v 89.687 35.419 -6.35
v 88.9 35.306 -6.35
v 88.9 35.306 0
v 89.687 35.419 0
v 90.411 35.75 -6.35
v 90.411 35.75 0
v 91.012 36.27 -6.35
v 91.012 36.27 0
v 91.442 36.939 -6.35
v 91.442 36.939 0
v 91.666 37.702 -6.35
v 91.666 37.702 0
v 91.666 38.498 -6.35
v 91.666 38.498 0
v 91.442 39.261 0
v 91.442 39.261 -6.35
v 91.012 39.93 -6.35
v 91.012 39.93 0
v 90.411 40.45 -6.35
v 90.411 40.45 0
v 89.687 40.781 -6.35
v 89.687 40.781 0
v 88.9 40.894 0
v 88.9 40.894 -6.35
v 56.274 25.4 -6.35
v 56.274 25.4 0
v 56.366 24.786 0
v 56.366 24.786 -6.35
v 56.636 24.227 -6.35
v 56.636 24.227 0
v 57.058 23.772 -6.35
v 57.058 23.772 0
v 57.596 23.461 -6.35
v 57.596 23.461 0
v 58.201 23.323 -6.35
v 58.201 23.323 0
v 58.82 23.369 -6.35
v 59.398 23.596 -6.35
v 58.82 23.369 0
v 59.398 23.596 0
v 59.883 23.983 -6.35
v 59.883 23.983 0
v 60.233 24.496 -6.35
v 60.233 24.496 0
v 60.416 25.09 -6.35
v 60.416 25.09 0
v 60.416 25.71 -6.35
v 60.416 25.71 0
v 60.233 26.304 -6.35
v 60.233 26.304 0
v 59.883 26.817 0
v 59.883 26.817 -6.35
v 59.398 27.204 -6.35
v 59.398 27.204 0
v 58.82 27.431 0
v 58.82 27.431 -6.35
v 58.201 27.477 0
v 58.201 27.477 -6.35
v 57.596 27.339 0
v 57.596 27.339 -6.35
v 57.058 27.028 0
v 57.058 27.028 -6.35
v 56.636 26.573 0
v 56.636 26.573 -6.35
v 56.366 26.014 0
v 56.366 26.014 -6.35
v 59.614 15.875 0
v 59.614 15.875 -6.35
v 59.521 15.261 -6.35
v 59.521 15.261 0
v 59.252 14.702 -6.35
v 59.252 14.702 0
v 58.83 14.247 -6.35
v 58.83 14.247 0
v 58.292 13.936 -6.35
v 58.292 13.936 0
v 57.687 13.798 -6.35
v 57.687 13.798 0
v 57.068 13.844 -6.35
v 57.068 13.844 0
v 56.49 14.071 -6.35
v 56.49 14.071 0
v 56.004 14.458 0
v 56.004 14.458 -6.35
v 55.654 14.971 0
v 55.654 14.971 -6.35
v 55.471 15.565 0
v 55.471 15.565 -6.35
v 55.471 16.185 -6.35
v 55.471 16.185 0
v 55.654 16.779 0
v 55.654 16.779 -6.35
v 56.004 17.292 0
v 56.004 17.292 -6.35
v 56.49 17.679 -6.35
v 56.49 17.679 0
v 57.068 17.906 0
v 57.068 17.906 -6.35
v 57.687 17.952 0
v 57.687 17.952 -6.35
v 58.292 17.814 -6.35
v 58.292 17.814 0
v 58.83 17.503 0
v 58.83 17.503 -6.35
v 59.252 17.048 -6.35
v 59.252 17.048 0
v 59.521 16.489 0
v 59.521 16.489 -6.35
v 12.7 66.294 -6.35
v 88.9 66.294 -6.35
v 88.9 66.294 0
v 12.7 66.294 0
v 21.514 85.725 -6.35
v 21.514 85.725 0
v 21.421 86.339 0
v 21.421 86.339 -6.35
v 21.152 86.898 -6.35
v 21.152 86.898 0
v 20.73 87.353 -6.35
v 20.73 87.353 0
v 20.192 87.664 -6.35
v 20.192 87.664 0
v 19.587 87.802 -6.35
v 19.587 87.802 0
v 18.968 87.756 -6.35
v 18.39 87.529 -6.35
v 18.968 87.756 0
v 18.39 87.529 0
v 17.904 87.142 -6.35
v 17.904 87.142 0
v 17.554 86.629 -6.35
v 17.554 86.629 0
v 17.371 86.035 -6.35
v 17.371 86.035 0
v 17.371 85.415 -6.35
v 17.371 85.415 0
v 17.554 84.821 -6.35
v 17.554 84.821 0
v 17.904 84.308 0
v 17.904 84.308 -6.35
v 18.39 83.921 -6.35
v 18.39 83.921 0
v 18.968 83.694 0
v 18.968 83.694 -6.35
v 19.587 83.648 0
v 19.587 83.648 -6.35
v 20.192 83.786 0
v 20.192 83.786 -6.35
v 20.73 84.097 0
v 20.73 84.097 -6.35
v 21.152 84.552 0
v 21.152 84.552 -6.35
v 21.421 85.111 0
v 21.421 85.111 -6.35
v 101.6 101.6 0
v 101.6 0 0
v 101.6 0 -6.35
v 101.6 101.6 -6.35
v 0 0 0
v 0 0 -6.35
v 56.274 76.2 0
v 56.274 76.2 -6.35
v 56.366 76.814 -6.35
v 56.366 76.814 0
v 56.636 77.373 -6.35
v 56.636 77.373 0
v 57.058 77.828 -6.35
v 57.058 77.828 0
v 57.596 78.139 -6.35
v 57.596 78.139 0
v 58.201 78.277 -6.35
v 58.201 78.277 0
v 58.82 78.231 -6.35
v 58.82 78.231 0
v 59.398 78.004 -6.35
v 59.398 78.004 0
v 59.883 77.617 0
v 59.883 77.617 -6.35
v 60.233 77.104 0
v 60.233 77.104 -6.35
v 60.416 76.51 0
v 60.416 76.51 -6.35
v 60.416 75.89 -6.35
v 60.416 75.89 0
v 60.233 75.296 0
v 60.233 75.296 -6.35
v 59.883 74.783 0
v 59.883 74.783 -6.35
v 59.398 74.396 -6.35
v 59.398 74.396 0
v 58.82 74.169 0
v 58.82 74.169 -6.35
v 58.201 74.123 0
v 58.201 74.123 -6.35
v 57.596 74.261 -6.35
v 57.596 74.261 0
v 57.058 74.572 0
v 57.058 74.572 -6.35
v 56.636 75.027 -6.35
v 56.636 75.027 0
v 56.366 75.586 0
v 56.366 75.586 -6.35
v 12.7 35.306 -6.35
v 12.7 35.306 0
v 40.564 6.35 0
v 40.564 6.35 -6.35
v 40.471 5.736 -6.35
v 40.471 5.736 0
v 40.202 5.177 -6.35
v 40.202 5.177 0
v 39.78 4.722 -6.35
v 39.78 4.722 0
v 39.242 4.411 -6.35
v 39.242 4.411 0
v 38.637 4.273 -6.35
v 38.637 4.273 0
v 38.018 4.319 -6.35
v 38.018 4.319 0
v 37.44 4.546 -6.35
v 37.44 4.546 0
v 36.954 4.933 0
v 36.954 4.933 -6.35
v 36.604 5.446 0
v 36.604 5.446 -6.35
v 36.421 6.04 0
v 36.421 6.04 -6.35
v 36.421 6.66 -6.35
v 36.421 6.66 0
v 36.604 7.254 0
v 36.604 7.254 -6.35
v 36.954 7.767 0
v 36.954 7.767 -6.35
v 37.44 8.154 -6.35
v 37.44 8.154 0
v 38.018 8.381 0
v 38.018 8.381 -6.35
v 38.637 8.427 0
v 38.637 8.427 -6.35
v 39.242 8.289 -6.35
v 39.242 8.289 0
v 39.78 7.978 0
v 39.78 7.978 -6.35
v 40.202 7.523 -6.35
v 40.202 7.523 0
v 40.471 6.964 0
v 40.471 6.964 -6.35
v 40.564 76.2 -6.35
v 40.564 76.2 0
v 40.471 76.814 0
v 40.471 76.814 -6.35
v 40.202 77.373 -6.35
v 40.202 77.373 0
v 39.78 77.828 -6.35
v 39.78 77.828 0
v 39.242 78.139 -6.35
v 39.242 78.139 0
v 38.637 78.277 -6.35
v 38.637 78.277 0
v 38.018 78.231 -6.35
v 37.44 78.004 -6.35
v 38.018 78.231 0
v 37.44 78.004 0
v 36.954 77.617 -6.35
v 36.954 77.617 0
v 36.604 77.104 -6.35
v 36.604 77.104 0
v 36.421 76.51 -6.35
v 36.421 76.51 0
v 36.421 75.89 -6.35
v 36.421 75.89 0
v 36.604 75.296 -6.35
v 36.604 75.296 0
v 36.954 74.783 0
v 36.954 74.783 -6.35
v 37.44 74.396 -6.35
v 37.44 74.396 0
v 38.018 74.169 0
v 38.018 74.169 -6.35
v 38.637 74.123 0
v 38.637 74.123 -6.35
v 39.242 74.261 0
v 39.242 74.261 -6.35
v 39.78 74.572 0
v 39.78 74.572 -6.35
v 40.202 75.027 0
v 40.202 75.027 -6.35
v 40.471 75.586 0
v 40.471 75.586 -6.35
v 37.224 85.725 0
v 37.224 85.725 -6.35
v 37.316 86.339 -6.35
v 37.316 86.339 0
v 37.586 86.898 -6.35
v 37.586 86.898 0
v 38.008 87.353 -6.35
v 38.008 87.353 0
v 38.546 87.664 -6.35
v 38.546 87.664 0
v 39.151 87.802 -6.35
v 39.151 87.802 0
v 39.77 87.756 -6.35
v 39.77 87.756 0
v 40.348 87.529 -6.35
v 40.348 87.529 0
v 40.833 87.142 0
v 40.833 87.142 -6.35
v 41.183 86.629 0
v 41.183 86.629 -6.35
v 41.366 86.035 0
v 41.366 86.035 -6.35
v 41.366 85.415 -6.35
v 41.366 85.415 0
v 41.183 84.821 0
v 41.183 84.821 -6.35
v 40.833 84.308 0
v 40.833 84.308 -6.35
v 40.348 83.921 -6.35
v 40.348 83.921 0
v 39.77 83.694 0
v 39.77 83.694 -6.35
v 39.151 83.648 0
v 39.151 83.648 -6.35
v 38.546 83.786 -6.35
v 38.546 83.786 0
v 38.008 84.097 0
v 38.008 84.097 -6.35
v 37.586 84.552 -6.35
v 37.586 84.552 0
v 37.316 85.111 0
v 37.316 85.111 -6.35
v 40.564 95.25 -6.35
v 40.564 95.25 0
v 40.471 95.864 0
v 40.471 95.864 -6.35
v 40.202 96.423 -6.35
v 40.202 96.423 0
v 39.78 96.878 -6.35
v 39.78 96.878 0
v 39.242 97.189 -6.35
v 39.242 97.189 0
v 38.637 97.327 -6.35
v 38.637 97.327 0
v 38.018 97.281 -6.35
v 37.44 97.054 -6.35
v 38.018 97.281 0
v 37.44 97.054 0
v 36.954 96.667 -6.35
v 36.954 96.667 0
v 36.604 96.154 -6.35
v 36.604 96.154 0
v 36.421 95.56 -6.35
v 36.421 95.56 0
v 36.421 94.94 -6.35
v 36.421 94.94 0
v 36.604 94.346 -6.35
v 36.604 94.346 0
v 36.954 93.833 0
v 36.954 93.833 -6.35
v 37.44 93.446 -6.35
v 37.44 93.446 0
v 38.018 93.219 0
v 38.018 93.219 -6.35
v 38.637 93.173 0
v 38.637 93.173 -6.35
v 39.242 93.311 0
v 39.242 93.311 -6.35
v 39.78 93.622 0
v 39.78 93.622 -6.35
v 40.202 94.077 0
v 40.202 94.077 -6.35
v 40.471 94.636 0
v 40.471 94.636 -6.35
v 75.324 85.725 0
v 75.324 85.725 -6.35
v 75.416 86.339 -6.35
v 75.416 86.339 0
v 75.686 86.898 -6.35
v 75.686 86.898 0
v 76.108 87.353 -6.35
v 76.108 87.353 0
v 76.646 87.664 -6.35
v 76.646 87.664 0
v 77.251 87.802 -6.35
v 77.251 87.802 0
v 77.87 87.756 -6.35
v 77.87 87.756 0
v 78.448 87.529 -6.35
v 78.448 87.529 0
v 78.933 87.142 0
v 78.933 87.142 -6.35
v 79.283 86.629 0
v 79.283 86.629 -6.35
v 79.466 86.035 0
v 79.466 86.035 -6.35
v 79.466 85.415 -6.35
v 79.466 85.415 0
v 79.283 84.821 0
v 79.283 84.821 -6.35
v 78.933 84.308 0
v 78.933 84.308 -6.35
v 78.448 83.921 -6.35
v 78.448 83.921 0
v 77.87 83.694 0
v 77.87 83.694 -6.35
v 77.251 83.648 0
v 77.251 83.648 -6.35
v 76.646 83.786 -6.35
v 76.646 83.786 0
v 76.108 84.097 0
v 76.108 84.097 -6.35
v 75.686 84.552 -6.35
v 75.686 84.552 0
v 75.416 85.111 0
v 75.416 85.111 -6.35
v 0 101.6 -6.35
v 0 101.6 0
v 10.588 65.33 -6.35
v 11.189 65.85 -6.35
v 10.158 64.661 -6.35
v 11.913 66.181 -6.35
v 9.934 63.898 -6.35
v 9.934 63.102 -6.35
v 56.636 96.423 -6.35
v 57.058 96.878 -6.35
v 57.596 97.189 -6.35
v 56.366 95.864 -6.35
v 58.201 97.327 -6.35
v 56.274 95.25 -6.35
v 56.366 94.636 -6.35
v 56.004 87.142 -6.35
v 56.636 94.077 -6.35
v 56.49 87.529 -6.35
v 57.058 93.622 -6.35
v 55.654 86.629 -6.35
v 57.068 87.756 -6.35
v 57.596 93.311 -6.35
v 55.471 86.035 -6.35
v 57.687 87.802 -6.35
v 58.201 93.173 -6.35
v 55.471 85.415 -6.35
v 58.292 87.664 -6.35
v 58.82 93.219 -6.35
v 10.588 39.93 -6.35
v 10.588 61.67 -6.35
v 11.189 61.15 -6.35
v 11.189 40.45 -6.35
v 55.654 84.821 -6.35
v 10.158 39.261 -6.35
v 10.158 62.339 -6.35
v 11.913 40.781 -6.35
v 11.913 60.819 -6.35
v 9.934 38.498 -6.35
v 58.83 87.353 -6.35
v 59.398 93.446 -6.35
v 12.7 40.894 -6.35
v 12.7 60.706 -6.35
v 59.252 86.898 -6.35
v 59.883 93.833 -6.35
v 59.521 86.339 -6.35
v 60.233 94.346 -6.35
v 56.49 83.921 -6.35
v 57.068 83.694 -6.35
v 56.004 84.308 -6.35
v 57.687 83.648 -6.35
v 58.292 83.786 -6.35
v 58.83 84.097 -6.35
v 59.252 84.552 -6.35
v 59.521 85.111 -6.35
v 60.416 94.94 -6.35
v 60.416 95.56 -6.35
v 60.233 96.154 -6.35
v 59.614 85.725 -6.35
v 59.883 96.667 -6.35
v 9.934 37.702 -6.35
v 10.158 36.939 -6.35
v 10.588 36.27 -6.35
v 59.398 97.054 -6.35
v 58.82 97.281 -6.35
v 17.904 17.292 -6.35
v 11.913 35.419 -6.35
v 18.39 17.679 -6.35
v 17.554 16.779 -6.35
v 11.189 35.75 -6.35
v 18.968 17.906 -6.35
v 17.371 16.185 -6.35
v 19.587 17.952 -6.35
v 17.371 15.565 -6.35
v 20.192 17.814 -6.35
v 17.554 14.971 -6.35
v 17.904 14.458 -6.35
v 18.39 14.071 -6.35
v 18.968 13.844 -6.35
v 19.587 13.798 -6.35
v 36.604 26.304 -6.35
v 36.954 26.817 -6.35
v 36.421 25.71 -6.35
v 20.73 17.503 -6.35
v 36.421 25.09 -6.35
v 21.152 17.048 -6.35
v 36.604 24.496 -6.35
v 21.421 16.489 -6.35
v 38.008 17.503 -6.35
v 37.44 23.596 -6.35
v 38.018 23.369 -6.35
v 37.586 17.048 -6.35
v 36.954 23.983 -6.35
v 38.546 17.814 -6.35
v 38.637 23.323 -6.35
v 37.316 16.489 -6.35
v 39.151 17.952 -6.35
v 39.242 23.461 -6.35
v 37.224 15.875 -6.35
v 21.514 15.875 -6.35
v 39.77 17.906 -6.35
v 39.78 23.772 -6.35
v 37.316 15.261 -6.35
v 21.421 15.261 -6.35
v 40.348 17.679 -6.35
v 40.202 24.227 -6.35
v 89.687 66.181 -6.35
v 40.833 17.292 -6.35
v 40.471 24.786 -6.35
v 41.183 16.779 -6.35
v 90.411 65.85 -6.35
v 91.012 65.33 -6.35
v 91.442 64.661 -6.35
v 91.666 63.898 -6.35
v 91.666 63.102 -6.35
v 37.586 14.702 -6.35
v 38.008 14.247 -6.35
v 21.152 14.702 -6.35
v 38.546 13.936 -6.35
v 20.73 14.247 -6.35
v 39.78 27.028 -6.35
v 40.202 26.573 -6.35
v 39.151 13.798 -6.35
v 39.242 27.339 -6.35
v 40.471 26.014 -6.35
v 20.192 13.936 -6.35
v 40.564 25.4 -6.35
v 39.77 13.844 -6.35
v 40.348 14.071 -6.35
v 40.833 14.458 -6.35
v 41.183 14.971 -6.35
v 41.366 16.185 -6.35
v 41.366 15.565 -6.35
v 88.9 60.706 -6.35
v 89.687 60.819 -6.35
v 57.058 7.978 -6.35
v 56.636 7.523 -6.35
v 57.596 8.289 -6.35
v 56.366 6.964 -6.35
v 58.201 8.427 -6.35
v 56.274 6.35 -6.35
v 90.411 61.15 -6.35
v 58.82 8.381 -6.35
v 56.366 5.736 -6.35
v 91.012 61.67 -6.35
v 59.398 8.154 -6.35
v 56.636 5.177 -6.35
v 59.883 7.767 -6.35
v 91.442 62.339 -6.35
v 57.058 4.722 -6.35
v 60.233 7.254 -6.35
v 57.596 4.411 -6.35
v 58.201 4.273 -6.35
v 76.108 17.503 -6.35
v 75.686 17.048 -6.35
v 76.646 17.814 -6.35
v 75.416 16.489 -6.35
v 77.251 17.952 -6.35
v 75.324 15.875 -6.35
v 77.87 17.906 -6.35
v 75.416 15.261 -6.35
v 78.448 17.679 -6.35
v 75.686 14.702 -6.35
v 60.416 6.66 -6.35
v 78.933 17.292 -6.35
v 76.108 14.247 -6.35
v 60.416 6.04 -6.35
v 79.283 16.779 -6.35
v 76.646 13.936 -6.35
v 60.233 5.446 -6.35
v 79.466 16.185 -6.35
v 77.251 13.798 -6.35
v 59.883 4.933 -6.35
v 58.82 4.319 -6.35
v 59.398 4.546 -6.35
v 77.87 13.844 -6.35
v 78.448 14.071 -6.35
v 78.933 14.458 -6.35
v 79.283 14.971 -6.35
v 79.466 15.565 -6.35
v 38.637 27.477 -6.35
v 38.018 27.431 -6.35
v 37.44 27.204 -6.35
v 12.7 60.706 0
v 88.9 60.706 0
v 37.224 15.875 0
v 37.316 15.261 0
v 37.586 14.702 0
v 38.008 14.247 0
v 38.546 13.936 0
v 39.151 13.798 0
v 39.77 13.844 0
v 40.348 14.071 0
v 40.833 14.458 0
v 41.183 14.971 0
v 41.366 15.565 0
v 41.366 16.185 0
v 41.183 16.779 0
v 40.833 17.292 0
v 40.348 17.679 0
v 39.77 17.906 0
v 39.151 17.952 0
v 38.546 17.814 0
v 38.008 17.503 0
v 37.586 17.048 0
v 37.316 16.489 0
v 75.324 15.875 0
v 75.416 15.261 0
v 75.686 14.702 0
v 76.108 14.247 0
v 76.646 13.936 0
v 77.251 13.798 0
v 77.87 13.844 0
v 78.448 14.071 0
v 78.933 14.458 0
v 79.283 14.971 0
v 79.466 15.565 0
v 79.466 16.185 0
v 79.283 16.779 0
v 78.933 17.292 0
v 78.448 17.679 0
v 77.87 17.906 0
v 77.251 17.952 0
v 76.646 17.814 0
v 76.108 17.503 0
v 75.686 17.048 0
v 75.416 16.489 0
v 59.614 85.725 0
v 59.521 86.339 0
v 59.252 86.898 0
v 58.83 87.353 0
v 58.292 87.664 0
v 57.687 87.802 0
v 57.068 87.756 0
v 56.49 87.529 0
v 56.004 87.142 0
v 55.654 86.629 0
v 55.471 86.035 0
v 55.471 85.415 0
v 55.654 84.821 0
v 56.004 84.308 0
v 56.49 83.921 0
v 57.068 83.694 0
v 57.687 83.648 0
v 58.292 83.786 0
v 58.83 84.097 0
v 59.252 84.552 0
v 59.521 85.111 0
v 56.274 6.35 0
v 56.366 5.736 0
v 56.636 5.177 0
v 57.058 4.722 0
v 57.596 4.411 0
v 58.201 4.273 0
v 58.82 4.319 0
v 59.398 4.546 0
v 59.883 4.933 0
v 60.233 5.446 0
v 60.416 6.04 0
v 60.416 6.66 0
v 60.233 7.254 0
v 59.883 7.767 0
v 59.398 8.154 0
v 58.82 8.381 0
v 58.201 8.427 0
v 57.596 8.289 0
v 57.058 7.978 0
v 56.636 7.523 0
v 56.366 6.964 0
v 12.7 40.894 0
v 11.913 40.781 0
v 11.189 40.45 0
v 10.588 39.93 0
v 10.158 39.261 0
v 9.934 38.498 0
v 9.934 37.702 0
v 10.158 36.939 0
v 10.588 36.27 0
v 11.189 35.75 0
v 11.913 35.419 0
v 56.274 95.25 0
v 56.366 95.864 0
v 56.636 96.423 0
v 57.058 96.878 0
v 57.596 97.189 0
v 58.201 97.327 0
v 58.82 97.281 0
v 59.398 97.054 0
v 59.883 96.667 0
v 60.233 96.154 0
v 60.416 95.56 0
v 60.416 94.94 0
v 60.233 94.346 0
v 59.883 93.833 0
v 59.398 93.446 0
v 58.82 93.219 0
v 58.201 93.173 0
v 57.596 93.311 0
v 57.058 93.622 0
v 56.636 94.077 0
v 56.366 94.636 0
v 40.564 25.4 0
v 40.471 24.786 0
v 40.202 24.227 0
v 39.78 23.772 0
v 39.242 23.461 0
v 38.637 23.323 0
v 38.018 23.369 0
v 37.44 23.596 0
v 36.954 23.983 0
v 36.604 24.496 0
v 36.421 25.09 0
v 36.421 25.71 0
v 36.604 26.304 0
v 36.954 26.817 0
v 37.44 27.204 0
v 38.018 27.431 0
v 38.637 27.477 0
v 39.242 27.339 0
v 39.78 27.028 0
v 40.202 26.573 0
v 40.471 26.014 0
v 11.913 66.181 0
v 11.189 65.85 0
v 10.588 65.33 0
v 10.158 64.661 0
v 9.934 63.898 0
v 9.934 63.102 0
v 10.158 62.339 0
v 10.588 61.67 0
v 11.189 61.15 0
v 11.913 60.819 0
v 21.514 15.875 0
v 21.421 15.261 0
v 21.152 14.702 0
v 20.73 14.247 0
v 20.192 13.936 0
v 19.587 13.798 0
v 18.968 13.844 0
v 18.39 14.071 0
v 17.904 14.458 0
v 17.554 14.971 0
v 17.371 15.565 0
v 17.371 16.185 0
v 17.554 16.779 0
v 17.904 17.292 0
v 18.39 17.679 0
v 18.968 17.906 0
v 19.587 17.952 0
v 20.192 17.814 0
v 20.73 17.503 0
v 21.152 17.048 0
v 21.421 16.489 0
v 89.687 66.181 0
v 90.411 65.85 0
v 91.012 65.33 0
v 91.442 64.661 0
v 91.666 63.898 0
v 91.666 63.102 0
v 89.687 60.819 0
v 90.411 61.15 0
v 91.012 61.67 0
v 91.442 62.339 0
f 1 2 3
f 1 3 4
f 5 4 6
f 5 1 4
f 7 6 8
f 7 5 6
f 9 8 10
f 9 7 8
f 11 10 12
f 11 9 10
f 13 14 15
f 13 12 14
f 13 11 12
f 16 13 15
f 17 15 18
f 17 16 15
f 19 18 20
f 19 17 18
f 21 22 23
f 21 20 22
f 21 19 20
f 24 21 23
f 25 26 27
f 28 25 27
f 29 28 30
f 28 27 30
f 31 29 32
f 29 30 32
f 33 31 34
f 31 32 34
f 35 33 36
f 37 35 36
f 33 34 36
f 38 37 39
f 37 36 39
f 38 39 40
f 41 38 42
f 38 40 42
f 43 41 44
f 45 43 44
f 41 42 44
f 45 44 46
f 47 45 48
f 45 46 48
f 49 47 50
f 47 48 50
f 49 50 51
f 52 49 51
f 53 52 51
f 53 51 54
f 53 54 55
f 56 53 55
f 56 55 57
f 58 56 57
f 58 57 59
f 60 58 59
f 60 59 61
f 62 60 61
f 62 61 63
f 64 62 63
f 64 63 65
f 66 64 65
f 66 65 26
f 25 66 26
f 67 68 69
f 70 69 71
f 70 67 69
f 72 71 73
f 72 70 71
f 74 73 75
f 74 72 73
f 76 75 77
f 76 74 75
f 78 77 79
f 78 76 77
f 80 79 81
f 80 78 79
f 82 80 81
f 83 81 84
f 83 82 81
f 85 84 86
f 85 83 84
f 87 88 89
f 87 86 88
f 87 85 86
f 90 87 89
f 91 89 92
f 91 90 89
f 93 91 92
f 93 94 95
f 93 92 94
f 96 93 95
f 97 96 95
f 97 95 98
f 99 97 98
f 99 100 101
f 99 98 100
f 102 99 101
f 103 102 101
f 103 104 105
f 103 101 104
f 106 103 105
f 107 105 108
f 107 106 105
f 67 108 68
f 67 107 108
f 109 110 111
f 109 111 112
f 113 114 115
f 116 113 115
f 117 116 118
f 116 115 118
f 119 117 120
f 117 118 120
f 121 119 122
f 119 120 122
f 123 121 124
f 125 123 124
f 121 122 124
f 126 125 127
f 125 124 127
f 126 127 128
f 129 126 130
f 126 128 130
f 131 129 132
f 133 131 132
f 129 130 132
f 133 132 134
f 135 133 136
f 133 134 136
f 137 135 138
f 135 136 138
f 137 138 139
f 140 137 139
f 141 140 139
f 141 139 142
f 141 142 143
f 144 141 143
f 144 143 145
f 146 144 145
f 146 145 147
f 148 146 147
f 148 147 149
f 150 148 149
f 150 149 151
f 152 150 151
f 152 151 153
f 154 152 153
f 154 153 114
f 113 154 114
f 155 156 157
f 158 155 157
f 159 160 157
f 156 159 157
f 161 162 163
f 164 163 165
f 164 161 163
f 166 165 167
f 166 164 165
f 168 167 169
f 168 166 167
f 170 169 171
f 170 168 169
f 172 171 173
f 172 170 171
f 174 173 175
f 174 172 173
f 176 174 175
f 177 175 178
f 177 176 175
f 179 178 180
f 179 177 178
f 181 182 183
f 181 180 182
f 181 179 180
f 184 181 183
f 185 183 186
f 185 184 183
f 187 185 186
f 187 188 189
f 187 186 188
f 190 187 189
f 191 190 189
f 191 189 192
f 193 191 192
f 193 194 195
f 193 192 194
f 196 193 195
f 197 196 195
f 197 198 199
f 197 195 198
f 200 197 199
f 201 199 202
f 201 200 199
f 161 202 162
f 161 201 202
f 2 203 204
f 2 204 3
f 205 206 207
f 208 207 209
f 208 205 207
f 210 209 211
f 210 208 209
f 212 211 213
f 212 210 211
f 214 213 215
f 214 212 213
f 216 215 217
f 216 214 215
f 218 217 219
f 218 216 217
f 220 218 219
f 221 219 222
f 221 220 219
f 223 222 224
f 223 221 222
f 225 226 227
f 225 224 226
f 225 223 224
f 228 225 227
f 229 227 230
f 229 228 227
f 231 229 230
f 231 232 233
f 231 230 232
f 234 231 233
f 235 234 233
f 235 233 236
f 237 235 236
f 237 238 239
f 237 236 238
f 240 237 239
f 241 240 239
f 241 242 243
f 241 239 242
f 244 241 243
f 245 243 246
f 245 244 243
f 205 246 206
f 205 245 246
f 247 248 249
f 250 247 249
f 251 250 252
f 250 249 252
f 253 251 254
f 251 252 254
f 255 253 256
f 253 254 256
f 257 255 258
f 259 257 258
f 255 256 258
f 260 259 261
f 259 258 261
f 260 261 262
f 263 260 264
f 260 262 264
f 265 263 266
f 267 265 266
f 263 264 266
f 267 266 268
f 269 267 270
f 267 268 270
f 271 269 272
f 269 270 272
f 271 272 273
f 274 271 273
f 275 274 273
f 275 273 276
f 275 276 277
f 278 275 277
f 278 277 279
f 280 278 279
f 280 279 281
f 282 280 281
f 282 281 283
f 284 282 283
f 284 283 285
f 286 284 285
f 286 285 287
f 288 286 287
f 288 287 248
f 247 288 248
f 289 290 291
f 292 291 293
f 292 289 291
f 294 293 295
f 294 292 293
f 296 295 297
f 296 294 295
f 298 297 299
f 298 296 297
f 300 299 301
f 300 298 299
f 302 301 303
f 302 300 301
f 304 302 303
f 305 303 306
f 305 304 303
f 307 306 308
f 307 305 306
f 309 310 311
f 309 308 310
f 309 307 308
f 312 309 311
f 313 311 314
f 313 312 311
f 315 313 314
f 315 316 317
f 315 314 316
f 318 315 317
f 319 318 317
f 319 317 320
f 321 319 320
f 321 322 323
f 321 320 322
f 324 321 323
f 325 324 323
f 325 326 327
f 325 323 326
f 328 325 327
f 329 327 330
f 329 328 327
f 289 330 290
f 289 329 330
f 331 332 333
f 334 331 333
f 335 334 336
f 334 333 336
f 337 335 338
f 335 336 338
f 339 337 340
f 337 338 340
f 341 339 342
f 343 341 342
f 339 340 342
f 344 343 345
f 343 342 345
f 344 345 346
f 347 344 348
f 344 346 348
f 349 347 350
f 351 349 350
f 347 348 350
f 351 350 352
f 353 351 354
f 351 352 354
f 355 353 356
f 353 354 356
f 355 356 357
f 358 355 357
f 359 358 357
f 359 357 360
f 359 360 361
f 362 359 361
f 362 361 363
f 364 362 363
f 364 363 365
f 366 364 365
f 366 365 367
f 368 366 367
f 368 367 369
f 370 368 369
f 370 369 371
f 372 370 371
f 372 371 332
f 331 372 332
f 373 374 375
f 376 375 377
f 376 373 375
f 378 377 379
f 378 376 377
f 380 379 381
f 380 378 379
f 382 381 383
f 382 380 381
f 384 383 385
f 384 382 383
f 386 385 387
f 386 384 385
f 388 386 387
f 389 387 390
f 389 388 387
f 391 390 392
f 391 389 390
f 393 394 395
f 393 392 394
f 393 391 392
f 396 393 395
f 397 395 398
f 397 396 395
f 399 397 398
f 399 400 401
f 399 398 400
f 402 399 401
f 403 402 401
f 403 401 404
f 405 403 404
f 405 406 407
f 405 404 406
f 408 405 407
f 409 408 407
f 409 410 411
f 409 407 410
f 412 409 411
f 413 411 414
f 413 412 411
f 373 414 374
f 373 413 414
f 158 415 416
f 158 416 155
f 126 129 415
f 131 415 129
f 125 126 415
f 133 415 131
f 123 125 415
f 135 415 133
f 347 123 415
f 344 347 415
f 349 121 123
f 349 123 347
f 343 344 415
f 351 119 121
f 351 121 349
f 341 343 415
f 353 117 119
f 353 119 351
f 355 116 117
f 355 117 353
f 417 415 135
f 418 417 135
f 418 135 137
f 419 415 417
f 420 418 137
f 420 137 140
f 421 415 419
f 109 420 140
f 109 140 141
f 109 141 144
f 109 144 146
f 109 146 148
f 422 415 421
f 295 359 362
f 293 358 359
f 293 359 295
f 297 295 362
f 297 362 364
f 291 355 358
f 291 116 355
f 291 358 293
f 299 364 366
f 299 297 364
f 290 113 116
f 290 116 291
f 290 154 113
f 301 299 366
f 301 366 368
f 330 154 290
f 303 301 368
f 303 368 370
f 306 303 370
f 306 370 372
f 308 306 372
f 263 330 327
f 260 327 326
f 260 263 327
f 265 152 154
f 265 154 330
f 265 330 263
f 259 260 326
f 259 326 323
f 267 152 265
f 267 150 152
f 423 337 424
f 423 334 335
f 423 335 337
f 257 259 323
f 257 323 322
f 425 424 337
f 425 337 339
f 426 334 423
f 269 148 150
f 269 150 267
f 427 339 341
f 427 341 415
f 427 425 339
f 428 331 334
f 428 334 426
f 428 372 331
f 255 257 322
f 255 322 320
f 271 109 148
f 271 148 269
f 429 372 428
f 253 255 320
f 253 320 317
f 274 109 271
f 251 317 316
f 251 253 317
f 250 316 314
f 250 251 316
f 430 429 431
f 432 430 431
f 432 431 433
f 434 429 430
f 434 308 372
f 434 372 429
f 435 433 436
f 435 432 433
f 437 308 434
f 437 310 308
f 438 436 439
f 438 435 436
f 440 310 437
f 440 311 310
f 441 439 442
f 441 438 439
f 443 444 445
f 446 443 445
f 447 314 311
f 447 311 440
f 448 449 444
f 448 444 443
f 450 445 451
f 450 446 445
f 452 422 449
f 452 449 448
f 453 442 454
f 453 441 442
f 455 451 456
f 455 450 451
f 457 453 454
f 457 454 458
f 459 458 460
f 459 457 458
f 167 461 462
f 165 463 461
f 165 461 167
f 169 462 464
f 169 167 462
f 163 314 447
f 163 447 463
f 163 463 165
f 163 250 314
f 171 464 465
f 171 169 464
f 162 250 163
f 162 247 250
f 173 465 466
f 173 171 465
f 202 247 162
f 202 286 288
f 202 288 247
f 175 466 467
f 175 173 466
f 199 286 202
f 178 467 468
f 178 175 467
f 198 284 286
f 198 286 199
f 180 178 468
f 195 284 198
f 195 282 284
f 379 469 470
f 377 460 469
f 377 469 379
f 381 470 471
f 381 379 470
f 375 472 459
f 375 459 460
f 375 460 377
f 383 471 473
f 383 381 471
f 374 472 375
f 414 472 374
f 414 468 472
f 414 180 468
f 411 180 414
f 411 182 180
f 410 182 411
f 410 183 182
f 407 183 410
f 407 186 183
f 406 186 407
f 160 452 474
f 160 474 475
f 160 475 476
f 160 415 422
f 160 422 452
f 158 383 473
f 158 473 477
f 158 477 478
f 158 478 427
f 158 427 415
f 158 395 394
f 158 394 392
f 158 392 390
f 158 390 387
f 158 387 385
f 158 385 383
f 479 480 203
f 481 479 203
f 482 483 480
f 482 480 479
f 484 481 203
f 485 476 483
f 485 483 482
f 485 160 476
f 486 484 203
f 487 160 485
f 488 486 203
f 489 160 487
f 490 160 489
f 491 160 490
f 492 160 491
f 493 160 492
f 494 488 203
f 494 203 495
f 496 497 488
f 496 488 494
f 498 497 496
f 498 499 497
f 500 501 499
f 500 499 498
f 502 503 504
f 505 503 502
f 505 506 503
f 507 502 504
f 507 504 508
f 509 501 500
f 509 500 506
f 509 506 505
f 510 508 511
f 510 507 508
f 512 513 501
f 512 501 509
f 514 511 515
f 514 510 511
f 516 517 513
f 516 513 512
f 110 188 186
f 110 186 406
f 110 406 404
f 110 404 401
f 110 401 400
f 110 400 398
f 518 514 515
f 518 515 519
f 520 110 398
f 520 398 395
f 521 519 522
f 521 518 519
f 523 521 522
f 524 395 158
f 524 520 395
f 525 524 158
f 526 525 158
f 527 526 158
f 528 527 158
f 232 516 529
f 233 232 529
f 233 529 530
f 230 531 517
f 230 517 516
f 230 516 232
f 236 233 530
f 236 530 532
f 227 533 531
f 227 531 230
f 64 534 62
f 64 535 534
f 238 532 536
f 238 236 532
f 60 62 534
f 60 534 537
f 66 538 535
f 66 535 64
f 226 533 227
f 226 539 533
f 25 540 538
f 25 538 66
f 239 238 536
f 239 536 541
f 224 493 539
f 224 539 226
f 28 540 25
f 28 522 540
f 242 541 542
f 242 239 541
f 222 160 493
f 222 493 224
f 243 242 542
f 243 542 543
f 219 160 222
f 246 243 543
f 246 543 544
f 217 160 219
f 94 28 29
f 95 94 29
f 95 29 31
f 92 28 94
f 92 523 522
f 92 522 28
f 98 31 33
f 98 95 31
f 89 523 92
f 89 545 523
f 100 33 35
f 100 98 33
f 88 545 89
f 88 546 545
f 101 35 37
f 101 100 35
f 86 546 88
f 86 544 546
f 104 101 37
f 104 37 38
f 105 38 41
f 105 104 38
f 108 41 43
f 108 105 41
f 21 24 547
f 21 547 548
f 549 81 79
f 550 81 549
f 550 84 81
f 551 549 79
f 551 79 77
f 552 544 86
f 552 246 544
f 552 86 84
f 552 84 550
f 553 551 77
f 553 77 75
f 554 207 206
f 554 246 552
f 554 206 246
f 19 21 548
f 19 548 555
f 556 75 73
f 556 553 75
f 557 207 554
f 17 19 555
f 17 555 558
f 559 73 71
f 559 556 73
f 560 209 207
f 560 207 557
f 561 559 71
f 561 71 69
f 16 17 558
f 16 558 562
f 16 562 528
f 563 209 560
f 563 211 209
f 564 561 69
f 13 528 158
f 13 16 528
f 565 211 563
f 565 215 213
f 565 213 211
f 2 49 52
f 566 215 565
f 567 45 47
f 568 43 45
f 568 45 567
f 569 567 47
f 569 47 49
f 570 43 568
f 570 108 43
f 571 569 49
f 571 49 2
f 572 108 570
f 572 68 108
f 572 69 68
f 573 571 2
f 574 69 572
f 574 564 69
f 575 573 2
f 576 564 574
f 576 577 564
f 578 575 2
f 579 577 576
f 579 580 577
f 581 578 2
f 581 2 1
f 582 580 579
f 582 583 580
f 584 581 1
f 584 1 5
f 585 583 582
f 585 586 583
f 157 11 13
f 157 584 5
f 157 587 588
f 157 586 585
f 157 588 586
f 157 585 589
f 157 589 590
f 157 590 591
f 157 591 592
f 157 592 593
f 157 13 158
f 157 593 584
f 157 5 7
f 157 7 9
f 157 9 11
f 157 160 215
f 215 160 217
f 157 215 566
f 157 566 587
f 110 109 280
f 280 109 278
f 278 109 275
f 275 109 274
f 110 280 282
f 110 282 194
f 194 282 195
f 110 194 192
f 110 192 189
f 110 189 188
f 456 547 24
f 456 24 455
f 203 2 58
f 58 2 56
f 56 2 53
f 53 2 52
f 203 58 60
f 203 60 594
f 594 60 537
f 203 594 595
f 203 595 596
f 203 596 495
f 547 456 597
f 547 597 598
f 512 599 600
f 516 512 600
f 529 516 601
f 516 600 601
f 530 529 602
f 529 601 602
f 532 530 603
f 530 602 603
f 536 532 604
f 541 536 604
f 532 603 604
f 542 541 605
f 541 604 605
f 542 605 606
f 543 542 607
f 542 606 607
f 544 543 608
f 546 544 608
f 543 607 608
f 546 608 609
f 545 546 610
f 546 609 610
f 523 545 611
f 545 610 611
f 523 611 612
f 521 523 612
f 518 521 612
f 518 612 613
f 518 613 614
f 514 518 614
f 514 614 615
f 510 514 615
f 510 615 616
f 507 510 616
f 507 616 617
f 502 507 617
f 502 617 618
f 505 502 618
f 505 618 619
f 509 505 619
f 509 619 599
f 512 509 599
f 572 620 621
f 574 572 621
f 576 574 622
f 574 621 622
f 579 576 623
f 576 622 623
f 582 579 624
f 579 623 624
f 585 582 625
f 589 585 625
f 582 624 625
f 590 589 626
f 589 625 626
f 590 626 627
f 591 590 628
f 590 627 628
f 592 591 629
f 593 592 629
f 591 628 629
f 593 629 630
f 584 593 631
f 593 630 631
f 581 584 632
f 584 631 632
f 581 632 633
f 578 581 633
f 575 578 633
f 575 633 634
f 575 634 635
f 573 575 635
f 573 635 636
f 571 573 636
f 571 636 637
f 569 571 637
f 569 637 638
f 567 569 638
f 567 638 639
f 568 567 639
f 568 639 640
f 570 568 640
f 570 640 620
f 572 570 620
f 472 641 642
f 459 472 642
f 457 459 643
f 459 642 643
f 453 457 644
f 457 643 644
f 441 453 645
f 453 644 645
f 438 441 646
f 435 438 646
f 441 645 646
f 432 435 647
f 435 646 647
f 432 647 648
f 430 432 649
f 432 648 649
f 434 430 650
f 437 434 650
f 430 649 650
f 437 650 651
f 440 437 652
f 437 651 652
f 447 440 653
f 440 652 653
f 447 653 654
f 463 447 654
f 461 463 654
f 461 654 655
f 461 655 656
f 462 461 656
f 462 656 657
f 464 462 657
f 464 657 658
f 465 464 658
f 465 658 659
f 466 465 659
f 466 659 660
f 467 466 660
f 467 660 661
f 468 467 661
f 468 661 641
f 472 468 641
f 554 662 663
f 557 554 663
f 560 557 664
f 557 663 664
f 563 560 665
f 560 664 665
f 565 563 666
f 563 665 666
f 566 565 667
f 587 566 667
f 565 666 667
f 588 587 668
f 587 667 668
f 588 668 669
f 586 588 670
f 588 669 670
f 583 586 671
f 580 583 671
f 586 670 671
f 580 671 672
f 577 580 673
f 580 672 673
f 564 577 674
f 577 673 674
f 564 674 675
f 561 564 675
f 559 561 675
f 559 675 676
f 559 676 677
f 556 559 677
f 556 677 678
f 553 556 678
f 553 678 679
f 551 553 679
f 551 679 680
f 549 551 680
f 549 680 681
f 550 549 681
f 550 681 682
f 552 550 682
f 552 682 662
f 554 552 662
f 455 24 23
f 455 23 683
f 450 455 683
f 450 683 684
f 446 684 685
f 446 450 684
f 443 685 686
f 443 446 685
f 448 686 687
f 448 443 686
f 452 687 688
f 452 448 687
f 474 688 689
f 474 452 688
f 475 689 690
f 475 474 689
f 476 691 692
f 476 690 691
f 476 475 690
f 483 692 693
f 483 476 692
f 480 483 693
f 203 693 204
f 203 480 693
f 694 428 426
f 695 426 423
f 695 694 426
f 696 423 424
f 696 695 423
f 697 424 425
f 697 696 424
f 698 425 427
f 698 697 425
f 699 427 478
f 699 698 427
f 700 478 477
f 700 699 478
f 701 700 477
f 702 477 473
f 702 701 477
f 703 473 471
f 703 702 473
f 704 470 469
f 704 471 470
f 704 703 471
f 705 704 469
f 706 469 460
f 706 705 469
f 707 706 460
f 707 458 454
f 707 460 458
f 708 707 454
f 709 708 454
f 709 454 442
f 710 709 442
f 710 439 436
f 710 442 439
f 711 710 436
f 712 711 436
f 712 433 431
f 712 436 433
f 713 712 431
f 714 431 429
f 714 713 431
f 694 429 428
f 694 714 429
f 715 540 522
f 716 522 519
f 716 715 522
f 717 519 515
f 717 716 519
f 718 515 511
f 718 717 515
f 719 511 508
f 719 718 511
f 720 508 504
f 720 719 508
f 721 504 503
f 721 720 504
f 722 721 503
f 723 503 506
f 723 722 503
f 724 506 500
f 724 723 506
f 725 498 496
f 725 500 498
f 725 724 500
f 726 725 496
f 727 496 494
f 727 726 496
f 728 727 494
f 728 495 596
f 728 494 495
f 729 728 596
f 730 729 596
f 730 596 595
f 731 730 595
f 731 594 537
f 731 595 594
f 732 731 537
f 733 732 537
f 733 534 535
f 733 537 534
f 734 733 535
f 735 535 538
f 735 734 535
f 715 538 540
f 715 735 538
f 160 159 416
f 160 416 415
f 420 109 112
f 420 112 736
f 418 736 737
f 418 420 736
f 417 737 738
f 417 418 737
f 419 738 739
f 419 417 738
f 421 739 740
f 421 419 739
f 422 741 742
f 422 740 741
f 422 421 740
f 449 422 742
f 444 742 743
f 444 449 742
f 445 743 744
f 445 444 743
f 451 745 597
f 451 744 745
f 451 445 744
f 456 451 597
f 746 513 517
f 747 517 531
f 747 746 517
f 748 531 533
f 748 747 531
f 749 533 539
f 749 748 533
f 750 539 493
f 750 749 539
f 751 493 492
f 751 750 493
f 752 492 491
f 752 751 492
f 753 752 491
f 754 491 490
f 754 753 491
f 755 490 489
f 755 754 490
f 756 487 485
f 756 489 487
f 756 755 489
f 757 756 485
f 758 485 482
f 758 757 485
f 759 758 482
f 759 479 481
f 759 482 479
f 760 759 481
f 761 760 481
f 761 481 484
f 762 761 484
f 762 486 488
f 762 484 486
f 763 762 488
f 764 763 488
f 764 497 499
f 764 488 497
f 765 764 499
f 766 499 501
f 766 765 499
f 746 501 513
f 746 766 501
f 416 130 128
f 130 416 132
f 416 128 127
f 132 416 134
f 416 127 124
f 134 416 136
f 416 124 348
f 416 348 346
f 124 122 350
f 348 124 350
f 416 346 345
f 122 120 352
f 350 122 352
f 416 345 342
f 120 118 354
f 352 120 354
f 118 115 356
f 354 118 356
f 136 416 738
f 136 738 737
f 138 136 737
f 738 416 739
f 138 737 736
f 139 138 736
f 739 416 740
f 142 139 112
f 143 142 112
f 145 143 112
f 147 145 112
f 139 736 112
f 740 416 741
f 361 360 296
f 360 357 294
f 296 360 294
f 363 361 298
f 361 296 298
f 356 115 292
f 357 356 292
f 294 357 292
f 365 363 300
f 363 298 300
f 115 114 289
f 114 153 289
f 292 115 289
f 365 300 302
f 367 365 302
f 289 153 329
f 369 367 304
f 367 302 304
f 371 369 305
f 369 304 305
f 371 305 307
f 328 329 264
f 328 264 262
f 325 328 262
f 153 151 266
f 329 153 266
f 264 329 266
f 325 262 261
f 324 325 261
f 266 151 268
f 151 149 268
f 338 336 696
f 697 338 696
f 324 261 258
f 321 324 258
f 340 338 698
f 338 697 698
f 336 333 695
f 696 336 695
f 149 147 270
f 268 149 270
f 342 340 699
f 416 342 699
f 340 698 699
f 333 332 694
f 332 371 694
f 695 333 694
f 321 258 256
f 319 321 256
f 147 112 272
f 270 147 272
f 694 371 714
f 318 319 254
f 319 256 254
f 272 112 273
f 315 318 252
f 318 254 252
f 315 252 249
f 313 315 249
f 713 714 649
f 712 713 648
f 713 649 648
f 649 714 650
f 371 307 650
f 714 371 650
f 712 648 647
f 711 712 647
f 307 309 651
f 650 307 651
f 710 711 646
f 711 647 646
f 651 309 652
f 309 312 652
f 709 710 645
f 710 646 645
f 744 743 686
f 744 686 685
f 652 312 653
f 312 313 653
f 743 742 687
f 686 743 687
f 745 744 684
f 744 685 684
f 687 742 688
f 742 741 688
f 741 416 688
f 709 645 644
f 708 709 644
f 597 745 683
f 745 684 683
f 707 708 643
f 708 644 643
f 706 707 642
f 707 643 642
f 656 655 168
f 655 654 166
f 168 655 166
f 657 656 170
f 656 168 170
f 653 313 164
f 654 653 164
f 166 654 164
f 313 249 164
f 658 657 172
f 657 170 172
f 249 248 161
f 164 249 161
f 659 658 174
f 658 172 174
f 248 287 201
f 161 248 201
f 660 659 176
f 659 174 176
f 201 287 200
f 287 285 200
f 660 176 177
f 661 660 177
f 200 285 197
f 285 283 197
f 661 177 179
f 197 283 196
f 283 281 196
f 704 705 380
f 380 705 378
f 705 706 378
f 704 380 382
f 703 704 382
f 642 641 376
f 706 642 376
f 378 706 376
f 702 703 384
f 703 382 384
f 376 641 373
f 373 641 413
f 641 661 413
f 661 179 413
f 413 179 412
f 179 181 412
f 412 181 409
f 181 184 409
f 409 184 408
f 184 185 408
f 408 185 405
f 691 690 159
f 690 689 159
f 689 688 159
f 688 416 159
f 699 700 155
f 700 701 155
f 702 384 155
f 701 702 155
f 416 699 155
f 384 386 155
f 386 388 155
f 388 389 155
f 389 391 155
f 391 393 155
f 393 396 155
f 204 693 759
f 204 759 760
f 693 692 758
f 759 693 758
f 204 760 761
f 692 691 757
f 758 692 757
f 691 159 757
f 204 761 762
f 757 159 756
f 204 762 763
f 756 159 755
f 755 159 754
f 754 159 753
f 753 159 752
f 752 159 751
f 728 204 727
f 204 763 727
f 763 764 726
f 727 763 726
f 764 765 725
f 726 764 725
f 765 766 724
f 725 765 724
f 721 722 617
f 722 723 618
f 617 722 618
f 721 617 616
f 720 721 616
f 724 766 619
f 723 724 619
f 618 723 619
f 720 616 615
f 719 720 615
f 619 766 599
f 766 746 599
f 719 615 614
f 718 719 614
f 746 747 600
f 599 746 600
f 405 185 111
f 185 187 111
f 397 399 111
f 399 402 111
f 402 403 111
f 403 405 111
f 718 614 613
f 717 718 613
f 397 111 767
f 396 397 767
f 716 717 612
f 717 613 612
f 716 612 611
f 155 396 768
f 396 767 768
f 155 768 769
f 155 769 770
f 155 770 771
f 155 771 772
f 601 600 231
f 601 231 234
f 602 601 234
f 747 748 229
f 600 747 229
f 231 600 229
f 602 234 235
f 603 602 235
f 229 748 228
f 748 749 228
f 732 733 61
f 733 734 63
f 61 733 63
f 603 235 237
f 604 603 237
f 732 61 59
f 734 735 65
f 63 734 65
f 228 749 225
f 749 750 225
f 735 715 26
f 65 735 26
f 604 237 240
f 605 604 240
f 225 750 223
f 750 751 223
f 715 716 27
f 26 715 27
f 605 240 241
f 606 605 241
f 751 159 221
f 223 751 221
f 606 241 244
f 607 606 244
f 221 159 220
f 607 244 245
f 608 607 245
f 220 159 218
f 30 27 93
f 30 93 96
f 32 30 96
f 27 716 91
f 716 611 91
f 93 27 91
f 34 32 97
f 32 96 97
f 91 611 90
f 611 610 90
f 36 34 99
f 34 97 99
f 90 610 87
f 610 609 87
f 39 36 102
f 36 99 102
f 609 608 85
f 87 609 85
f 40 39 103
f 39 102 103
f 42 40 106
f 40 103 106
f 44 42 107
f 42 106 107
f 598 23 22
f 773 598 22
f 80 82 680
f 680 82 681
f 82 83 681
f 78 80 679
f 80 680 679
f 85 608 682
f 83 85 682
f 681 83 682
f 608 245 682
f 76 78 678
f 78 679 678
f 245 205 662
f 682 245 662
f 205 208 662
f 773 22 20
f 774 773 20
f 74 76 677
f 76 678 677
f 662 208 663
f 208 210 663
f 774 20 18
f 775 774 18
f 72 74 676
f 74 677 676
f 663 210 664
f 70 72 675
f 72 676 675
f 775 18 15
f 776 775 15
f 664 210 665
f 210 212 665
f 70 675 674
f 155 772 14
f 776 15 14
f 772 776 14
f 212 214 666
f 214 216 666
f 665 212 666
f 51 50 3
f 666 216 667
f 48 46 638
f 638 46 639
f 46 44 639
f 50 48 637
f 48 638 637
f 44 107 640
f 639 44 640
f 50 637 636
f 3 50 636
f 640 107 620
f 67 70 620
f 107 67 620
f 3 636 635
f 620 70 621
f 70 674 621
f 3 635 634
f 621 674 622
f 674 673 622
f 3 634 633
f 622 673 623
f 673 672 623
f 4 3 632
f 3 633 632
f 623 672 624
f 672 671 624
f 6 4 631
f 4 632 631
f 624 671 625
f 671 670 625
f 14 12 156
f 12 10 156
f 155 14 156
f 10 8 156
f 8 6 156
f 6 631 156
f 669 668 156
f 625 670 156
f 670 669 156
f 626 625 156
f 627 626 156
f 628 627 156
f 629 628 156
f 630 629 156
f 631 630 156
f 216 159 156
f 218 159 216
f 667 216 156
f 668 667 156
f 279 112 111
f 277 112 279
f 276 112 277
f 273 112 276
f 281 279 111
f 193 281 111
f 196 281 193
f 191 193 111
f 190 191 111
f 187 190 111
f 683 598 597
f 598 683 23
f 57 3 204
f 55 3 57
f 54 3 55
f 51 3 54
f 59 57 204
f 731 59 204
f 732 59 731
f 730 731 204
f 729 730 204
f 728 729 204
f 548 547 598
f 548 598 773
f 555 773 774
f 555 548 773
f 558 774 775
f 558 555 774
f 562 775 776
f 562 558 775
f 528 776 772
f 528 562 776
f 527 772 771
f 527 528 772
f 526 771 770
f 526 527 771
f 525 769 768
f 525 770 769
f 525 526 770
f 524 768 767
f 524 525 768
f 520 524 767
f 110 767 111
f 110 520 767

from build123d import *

# Parameters (mm, degrees)
SKETCH1_W               = 101.6
SKETCH1_H               = 6.35
BOSS_EXTRUDE1_DEPTH     = 101.6
CUT_EXTRUDE1_DEPTH      = 144.824345992
SKETCH5_R               = 2.0828
CUT_EXTRUDE2_DEPTH      = 144.824345992
MIRROR2_COPY_1_SKETCH_R = 2.0828
MIRROR2_COPY_1_DEPTH    = 144.824345992


with BuildPart() as part:
    # Sketch1 → Boss-Extrude1 (new body)
    with BuildSketch(Plane(origin=(0, 0, 0), x_dir=(1, 0, 0), z_dir=(0, 1, 0))):
        with Locations((50.8, 3.175)):
            Rectangle(SKETCH1_W, SKETCH1_H)
    extrude(amount=BOSS_EXTRUDE1_DEPTH)

    # Sketch2 → Cut-Extrude1 (cut, through all)
    with BuildSketch(Plane(origin=(0, 0, -6.35), x_dir=(-1, 0, 0), z_dir=(0, 0, -1))):
        with BuildLine():
            Line((-88.9, 66.294), (-12.7, 66.294))
            ThreePointArc((-12.7, 66.294), (-9.906, 63.5), (-12.7, 60.706))
            Line((-12.7, 60.706), (-88.9, 60.706))
            ThreePointArc((-88.9, 60.706), (-91.694, 63.5), (-88.9, 66.294))
        make_face()
        with BuildLine():
            Line((-88.9, 40.894), (-12.7, 40.894))
            ThreePointArc((-12.7, 40.894), (-9.906, 38.1), (-12.7, 35.306))
            Line((-12.7, 35.306), (-88.9, 35.306))
            ThreePointArc((-88.9, 35.306), (-91.694, 38.1), (-88.9, 40.894))
        make_face()
    extrude(amount=-CUT_EXTRUDE1_DEPTH, mode=Mode.SUBTRACT)

    # Sketch5 → Cut-Extrude2 (cut, through all)
    with BuildSketch(Plane.XY):
        with Locations((19.431, 85.725)):
            Circle(SKETCH5_R)
        with Locations((38.481, 95.25)):
            Circle(SKETCH5_R)
        with Locations((38.481, 76.2)):
            Circle(SKETCH5_R)
        with Locations((57.531, 85.725)):
            Circle(SKETCH5_R)
    cut_extrude2 = extrude(amount=-CUT_EXTRUDE2_DEPTH, mode=Mode.SUBTRACT)

    # Mirror1: Cut-Extrude2 across plane
    add(cut_extrude2.mirror(Plane.ZX.offset(50.8)), mode=Mode.SUBTRACT)

    # Mirror2: Cut-Extrude2 across plane
    add(cut_extrude2.mirror(Plane(origin=(48.41875, 0, 0), x_dir=(0, 0, 1), z_dir=(1, 0, 0))), mode=Mode.SUBTRACT)

    # Mirror2 copy 1 sketch → Mirror2 copy 1 (cut, through all)
    with BuildSketch(Plane(origin=(96.8375, 101.6, 0), x_dir=(-1, 0, 0), z_dir=(0, 0, 1))):
        with Locations((19.431, 85.725)):
            Circle(MIRROR2_COPY_1_SKETCH_R)
        with Locations((38.481, 95.25)):
            Circle(MIRROR2_COPY_1_SKETCH_R)
        with Locations((38.481, 76.2)):
            Circle(MIRROR2_COPY_1_SKETCH_R)
        with Locations((57.531, 85.725)):
            Circle(MIRROR2_COPY_1_SKETCH_R)
    extrude(amount=-MIRROR2_COPY_1_DEPTH, mode=Mode.SUBTRACT)


solid = part.part
